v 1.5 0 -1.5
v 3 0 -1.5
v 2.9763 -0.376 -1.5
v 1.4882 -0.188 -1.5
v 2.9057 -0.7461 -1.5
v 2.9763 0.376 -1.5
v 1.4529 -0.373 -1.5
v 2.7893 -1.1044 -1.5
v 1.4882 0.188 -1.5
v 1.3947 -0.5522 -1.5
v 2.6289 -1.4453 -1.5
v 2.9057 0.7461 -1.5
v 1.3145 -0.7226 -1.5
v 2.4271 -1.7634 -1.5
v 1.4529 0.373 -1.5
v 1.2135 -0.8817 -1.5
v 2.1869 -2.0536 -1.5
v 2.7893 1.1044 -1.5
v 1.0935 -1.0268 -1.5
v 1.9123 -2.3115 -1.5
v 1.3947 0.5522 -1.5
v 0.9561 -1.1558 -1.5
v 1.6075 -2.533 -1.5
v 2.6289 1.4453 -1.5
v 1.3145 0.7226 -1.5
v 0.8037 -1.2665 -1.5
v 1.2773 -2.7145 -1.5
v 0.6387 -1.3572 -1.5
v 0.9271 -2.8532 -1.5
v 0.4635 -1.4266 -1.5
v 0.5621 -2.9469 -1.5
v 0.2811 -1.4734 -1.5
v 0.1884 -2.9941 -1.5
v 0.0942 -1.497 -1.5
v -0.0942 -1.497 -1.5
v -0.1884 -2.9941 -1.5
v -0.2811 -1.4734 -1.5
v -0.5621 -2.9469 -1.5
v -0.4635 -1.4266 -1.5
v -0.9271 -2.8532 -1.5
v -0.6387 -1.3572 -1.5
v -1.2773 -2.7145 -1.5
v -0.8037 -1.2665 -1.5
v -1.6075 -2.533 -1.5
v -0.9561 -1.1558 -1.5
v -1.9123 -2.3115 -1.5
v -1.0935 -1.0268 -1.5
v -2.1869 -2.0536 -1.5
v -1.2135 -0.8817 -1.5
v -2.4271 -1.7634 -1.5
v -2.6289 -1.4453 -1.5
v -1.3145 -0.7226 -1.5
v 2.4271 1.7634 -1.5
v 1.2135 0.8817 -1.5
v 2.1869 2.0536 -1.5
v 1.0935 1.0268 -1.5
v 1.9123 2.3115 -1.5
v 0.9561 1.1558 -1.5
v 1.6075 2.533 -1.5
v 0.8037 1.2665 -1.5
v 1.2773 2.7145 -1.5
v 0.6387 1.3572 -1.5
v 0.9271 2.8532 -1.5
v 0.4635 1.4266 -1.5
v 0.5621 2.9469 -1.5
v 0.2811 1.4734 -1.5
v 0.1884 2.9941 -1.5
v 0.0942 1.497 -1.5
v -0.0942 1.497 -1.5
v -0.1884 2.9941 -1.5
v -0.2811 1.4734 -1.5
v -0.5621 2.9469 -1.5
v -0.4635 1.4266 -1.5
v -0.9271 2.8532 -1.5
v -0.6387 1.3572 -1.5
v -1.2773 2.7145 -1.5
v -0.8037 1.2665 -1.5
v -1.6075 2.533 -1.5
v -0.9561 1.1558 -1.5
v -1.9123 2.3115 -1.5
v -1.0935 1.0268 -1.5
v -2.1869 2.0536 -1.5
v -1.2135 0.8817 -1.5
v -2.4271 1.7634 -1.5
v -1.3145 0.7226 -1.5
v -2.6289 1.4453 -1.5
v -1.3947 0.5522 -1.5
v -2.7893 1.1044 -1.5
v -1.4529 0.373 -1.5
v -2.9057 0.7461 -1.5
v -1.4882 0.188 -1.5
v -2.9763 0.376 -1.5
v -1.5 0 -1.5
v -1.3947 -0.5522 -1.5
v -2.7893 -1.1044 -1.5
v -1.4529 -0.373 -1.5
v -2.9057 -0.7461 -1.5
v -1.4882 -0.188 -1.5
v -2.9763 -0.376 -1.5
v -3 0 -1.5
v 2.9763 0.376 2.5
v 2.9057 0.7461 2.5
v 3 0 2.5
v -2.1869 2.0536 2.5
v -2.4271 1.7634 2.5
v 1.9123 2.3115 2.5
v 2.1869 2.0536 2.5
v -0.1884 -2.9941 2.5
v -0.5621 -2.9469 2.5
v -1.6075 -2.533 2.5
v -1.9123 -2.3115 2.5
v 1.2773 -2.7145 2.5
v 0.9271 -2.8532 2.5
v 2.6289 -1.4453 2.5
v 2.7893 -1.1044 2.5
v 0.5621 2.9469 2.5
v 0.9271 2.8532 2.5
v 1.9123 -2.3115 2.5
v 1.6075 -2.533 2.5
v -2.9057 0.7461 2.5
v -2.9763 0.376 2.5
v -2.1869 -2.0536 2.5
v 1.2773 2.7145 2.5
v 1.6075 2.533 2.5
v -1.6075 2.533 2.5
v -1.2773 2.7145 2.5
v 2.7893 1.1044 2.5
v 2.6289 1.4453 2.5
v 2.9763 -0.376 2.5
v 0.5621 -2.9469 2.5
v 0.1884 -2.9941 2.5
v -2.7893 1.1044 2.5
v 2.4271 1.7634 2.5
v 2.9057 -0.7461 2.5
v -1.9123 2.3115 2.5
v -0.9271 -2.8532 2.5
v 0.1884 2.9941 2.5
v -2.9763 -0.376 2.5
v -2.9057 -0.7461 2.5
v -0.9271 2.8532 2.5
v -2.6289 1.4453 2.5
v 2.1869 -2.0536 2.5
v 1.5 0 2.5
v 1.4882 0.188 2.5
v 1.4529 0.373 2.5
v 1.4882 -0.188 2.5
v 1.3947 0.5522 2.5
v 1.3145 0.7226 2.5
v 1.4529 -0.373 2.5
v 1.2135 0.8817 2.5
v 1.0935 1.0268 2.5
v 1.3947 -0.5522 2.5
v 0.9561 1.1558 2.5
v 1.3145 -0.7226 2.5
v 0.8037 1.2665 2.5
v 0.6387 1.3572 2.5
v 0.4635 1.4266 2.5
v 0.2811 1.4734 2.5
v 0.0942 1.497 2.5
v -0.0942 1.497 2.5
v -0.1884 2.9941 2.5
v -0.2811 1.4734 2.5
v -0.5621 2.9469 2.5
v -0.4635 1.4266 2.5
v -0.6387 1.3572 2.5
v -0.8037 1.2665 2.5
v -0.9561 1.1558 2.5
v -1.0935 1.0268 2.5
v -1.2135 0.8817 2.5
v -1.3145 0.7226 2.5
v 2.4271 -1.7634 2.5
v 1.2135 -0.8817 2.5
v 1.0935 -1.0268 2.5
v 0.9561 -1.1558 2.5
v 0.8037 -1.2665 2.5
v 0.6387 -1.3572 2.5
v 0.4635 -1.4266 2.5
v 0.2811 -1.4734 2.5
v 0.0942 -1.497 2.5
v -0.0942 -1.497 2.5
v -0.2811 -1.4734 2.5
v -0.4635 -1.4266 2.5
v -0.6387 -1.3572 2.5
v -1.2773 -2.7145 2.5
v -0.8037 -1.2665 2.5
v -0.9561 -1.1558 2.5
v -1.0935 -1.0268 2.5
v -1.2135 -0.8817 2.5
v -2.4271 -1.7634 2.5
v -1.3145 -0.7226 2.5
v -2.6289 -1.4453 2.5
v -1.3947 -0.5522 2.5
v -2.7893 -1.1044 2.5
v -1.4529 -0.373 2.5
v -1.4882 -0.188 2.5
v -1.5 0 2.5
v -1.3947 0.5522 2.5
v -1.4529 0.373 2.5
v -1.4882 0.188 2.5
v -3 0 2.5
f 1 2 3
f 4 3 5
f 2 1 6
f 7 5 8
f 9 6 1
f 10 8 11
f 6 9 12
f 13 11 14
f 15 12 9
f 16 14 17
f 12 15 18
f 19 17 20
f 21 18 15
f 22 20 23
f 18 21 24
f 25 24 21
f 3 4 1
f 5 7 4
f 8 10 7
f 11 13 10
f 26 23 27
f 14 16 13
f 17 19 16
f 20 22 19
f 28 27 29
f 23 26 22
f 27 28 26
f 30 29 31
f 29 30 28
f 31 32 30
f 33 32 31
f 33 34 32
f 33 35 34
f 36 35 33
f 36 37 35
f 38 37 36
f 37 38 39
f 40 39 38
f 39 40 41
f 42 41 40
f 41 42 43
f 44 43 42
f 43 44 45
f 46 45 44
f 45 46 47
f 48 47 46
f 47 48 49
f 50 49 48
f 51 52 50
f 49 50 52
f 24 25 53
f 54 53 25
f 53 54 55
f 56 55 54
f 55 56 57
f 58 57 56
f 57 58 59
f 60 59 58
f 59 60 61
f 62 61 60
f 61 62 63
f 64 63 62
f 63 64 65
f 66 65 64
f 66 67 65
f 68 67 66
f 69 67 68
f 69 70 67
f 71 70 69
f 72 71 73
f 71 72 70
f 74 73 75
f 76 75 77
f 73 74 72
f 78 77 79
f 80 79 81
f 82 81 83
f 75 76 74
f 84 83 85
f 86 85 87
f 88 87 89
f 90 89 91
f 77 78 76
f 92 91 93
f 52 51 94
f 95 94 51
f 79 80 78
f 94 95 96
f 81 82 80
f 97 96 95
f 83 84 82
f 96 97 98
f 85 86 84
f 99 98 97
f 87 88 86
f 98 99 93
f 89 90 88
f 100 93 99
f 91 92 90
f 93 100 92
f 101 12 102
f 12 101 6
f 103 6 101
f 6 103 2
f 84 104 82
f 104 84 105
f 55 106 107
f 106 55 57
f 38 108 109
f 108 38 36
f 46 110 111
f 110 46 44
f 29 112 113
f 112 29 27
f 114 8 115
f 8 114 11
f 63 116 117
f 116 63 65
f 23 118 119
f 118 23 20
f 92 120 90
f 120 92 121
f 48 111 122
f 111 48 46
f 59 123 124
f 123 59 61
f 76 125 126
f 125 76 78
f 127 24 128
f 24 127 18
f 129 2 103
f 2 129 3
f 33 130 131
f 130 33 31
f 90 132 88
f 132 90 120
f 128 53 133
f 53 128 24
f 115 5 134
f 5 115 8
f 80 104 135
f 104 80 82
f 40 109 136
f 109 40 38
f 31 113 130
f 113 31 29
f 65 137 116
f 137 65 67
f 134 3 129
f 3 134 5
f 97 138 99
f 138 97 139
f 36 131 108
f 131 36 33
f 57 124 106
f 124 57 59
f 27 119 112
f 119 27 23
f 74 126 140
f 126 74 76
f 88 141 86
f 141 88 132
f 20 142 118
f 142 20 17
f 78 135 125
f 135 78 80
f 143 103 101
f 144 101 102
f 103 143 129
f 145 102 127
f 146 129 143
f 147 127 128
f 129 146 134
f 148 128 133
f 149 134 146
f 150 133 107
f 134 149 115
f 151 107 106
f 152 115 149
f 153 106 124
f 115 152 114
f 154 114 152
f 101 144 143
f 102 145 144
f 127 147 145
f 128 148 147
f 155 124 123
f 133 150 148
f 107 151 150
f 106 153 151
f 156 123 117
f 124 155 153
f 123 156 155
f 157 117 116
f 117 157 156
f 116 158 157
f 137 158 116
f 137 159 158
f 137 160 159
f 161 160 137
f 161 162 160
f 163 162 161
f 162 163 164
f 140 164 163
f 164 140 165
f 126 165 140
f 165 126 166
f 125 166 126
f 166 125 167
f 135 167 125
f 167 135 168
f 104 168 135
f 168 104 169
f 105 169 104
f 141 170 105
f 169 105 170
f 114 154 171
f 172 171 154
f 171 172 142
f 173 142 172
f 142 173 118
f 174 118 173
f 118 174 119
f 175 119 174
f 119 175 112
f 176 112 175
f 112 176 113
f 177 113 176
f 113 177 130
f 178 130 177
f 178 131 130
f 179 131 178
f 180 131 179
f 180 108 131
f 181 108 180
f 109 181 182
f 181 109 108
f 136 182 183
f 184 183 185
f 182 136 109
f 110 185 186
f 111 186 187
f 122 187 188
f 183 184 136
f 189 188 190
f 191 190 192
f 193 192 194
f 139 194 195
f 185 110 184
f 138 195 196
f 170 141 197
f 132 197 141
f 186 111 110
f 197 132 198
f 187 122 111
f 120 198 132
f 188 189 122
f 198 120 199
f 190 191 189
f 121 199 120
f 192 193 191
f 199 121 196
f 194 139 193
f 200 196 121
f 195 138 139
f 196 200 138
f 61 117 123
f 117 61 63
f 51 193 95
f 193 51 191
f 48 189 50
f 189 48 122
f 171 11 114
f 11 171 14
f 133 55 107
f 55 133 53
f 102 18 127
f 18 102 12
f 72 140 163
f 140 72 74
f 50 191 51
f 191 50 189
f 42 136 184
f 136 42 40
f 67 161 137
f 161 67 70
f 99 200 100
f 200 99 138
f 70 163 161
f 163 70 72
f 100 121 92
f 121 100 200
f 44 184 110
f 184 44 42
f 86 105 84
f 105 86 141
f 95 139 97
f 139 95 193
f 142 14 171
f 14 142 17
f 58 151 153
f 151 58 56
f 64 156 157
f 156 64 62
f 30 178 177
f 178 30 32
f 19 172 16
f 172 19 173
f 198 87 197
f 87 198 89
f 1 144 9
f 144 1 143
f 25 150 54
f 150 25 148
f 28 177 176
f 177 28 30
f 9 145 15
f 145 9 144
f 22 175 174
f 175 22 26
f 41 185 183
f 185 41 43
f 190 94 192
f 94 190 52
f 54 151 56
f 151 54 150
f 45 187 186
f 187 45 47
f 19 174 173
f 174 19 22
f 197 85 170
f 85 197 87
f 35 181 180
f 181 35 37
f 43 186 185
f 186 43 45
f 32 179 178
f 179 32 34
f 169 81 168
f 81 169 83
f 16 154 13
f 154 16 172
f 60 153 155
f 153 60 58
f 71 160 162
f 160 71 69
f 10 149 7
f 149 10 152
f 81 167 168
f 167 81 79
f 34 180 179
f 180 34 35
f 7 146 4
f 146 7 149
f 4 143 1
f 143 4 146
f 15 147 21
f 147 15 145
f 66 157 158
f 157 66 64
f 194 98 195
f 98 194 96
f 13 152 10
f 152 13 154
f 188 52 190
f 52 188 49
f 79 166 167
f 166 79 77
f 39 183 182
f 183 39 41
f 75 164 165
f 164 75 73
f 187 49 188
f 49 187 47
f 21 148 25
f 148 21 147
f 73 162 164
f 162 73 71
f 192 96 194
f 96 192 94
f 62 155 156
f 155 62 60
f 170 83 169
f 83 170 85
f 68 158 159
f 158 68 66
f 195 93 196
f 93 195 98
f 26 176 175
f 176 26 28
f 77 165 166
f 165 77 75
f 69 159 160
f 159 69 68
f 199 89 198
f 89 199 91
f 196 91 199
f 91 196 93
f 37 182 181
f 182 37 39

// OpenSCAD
$fn = 50;


difference() {
	union() {
		translate(v = [0, 0, -1.5000000000]) {
			cylinder(h = 3, r = 1.0000000000);
		}
		translate(v = [0, 0, -1.5000000000]) {
			cylinder(h = 4, r = 3.0000000000);
		}
	}
	union() {
		translate(v = [0, 0, -100.0000000000]) {
			cylinder(h = 200, r = 1.5000000000);
		}
	}
}
